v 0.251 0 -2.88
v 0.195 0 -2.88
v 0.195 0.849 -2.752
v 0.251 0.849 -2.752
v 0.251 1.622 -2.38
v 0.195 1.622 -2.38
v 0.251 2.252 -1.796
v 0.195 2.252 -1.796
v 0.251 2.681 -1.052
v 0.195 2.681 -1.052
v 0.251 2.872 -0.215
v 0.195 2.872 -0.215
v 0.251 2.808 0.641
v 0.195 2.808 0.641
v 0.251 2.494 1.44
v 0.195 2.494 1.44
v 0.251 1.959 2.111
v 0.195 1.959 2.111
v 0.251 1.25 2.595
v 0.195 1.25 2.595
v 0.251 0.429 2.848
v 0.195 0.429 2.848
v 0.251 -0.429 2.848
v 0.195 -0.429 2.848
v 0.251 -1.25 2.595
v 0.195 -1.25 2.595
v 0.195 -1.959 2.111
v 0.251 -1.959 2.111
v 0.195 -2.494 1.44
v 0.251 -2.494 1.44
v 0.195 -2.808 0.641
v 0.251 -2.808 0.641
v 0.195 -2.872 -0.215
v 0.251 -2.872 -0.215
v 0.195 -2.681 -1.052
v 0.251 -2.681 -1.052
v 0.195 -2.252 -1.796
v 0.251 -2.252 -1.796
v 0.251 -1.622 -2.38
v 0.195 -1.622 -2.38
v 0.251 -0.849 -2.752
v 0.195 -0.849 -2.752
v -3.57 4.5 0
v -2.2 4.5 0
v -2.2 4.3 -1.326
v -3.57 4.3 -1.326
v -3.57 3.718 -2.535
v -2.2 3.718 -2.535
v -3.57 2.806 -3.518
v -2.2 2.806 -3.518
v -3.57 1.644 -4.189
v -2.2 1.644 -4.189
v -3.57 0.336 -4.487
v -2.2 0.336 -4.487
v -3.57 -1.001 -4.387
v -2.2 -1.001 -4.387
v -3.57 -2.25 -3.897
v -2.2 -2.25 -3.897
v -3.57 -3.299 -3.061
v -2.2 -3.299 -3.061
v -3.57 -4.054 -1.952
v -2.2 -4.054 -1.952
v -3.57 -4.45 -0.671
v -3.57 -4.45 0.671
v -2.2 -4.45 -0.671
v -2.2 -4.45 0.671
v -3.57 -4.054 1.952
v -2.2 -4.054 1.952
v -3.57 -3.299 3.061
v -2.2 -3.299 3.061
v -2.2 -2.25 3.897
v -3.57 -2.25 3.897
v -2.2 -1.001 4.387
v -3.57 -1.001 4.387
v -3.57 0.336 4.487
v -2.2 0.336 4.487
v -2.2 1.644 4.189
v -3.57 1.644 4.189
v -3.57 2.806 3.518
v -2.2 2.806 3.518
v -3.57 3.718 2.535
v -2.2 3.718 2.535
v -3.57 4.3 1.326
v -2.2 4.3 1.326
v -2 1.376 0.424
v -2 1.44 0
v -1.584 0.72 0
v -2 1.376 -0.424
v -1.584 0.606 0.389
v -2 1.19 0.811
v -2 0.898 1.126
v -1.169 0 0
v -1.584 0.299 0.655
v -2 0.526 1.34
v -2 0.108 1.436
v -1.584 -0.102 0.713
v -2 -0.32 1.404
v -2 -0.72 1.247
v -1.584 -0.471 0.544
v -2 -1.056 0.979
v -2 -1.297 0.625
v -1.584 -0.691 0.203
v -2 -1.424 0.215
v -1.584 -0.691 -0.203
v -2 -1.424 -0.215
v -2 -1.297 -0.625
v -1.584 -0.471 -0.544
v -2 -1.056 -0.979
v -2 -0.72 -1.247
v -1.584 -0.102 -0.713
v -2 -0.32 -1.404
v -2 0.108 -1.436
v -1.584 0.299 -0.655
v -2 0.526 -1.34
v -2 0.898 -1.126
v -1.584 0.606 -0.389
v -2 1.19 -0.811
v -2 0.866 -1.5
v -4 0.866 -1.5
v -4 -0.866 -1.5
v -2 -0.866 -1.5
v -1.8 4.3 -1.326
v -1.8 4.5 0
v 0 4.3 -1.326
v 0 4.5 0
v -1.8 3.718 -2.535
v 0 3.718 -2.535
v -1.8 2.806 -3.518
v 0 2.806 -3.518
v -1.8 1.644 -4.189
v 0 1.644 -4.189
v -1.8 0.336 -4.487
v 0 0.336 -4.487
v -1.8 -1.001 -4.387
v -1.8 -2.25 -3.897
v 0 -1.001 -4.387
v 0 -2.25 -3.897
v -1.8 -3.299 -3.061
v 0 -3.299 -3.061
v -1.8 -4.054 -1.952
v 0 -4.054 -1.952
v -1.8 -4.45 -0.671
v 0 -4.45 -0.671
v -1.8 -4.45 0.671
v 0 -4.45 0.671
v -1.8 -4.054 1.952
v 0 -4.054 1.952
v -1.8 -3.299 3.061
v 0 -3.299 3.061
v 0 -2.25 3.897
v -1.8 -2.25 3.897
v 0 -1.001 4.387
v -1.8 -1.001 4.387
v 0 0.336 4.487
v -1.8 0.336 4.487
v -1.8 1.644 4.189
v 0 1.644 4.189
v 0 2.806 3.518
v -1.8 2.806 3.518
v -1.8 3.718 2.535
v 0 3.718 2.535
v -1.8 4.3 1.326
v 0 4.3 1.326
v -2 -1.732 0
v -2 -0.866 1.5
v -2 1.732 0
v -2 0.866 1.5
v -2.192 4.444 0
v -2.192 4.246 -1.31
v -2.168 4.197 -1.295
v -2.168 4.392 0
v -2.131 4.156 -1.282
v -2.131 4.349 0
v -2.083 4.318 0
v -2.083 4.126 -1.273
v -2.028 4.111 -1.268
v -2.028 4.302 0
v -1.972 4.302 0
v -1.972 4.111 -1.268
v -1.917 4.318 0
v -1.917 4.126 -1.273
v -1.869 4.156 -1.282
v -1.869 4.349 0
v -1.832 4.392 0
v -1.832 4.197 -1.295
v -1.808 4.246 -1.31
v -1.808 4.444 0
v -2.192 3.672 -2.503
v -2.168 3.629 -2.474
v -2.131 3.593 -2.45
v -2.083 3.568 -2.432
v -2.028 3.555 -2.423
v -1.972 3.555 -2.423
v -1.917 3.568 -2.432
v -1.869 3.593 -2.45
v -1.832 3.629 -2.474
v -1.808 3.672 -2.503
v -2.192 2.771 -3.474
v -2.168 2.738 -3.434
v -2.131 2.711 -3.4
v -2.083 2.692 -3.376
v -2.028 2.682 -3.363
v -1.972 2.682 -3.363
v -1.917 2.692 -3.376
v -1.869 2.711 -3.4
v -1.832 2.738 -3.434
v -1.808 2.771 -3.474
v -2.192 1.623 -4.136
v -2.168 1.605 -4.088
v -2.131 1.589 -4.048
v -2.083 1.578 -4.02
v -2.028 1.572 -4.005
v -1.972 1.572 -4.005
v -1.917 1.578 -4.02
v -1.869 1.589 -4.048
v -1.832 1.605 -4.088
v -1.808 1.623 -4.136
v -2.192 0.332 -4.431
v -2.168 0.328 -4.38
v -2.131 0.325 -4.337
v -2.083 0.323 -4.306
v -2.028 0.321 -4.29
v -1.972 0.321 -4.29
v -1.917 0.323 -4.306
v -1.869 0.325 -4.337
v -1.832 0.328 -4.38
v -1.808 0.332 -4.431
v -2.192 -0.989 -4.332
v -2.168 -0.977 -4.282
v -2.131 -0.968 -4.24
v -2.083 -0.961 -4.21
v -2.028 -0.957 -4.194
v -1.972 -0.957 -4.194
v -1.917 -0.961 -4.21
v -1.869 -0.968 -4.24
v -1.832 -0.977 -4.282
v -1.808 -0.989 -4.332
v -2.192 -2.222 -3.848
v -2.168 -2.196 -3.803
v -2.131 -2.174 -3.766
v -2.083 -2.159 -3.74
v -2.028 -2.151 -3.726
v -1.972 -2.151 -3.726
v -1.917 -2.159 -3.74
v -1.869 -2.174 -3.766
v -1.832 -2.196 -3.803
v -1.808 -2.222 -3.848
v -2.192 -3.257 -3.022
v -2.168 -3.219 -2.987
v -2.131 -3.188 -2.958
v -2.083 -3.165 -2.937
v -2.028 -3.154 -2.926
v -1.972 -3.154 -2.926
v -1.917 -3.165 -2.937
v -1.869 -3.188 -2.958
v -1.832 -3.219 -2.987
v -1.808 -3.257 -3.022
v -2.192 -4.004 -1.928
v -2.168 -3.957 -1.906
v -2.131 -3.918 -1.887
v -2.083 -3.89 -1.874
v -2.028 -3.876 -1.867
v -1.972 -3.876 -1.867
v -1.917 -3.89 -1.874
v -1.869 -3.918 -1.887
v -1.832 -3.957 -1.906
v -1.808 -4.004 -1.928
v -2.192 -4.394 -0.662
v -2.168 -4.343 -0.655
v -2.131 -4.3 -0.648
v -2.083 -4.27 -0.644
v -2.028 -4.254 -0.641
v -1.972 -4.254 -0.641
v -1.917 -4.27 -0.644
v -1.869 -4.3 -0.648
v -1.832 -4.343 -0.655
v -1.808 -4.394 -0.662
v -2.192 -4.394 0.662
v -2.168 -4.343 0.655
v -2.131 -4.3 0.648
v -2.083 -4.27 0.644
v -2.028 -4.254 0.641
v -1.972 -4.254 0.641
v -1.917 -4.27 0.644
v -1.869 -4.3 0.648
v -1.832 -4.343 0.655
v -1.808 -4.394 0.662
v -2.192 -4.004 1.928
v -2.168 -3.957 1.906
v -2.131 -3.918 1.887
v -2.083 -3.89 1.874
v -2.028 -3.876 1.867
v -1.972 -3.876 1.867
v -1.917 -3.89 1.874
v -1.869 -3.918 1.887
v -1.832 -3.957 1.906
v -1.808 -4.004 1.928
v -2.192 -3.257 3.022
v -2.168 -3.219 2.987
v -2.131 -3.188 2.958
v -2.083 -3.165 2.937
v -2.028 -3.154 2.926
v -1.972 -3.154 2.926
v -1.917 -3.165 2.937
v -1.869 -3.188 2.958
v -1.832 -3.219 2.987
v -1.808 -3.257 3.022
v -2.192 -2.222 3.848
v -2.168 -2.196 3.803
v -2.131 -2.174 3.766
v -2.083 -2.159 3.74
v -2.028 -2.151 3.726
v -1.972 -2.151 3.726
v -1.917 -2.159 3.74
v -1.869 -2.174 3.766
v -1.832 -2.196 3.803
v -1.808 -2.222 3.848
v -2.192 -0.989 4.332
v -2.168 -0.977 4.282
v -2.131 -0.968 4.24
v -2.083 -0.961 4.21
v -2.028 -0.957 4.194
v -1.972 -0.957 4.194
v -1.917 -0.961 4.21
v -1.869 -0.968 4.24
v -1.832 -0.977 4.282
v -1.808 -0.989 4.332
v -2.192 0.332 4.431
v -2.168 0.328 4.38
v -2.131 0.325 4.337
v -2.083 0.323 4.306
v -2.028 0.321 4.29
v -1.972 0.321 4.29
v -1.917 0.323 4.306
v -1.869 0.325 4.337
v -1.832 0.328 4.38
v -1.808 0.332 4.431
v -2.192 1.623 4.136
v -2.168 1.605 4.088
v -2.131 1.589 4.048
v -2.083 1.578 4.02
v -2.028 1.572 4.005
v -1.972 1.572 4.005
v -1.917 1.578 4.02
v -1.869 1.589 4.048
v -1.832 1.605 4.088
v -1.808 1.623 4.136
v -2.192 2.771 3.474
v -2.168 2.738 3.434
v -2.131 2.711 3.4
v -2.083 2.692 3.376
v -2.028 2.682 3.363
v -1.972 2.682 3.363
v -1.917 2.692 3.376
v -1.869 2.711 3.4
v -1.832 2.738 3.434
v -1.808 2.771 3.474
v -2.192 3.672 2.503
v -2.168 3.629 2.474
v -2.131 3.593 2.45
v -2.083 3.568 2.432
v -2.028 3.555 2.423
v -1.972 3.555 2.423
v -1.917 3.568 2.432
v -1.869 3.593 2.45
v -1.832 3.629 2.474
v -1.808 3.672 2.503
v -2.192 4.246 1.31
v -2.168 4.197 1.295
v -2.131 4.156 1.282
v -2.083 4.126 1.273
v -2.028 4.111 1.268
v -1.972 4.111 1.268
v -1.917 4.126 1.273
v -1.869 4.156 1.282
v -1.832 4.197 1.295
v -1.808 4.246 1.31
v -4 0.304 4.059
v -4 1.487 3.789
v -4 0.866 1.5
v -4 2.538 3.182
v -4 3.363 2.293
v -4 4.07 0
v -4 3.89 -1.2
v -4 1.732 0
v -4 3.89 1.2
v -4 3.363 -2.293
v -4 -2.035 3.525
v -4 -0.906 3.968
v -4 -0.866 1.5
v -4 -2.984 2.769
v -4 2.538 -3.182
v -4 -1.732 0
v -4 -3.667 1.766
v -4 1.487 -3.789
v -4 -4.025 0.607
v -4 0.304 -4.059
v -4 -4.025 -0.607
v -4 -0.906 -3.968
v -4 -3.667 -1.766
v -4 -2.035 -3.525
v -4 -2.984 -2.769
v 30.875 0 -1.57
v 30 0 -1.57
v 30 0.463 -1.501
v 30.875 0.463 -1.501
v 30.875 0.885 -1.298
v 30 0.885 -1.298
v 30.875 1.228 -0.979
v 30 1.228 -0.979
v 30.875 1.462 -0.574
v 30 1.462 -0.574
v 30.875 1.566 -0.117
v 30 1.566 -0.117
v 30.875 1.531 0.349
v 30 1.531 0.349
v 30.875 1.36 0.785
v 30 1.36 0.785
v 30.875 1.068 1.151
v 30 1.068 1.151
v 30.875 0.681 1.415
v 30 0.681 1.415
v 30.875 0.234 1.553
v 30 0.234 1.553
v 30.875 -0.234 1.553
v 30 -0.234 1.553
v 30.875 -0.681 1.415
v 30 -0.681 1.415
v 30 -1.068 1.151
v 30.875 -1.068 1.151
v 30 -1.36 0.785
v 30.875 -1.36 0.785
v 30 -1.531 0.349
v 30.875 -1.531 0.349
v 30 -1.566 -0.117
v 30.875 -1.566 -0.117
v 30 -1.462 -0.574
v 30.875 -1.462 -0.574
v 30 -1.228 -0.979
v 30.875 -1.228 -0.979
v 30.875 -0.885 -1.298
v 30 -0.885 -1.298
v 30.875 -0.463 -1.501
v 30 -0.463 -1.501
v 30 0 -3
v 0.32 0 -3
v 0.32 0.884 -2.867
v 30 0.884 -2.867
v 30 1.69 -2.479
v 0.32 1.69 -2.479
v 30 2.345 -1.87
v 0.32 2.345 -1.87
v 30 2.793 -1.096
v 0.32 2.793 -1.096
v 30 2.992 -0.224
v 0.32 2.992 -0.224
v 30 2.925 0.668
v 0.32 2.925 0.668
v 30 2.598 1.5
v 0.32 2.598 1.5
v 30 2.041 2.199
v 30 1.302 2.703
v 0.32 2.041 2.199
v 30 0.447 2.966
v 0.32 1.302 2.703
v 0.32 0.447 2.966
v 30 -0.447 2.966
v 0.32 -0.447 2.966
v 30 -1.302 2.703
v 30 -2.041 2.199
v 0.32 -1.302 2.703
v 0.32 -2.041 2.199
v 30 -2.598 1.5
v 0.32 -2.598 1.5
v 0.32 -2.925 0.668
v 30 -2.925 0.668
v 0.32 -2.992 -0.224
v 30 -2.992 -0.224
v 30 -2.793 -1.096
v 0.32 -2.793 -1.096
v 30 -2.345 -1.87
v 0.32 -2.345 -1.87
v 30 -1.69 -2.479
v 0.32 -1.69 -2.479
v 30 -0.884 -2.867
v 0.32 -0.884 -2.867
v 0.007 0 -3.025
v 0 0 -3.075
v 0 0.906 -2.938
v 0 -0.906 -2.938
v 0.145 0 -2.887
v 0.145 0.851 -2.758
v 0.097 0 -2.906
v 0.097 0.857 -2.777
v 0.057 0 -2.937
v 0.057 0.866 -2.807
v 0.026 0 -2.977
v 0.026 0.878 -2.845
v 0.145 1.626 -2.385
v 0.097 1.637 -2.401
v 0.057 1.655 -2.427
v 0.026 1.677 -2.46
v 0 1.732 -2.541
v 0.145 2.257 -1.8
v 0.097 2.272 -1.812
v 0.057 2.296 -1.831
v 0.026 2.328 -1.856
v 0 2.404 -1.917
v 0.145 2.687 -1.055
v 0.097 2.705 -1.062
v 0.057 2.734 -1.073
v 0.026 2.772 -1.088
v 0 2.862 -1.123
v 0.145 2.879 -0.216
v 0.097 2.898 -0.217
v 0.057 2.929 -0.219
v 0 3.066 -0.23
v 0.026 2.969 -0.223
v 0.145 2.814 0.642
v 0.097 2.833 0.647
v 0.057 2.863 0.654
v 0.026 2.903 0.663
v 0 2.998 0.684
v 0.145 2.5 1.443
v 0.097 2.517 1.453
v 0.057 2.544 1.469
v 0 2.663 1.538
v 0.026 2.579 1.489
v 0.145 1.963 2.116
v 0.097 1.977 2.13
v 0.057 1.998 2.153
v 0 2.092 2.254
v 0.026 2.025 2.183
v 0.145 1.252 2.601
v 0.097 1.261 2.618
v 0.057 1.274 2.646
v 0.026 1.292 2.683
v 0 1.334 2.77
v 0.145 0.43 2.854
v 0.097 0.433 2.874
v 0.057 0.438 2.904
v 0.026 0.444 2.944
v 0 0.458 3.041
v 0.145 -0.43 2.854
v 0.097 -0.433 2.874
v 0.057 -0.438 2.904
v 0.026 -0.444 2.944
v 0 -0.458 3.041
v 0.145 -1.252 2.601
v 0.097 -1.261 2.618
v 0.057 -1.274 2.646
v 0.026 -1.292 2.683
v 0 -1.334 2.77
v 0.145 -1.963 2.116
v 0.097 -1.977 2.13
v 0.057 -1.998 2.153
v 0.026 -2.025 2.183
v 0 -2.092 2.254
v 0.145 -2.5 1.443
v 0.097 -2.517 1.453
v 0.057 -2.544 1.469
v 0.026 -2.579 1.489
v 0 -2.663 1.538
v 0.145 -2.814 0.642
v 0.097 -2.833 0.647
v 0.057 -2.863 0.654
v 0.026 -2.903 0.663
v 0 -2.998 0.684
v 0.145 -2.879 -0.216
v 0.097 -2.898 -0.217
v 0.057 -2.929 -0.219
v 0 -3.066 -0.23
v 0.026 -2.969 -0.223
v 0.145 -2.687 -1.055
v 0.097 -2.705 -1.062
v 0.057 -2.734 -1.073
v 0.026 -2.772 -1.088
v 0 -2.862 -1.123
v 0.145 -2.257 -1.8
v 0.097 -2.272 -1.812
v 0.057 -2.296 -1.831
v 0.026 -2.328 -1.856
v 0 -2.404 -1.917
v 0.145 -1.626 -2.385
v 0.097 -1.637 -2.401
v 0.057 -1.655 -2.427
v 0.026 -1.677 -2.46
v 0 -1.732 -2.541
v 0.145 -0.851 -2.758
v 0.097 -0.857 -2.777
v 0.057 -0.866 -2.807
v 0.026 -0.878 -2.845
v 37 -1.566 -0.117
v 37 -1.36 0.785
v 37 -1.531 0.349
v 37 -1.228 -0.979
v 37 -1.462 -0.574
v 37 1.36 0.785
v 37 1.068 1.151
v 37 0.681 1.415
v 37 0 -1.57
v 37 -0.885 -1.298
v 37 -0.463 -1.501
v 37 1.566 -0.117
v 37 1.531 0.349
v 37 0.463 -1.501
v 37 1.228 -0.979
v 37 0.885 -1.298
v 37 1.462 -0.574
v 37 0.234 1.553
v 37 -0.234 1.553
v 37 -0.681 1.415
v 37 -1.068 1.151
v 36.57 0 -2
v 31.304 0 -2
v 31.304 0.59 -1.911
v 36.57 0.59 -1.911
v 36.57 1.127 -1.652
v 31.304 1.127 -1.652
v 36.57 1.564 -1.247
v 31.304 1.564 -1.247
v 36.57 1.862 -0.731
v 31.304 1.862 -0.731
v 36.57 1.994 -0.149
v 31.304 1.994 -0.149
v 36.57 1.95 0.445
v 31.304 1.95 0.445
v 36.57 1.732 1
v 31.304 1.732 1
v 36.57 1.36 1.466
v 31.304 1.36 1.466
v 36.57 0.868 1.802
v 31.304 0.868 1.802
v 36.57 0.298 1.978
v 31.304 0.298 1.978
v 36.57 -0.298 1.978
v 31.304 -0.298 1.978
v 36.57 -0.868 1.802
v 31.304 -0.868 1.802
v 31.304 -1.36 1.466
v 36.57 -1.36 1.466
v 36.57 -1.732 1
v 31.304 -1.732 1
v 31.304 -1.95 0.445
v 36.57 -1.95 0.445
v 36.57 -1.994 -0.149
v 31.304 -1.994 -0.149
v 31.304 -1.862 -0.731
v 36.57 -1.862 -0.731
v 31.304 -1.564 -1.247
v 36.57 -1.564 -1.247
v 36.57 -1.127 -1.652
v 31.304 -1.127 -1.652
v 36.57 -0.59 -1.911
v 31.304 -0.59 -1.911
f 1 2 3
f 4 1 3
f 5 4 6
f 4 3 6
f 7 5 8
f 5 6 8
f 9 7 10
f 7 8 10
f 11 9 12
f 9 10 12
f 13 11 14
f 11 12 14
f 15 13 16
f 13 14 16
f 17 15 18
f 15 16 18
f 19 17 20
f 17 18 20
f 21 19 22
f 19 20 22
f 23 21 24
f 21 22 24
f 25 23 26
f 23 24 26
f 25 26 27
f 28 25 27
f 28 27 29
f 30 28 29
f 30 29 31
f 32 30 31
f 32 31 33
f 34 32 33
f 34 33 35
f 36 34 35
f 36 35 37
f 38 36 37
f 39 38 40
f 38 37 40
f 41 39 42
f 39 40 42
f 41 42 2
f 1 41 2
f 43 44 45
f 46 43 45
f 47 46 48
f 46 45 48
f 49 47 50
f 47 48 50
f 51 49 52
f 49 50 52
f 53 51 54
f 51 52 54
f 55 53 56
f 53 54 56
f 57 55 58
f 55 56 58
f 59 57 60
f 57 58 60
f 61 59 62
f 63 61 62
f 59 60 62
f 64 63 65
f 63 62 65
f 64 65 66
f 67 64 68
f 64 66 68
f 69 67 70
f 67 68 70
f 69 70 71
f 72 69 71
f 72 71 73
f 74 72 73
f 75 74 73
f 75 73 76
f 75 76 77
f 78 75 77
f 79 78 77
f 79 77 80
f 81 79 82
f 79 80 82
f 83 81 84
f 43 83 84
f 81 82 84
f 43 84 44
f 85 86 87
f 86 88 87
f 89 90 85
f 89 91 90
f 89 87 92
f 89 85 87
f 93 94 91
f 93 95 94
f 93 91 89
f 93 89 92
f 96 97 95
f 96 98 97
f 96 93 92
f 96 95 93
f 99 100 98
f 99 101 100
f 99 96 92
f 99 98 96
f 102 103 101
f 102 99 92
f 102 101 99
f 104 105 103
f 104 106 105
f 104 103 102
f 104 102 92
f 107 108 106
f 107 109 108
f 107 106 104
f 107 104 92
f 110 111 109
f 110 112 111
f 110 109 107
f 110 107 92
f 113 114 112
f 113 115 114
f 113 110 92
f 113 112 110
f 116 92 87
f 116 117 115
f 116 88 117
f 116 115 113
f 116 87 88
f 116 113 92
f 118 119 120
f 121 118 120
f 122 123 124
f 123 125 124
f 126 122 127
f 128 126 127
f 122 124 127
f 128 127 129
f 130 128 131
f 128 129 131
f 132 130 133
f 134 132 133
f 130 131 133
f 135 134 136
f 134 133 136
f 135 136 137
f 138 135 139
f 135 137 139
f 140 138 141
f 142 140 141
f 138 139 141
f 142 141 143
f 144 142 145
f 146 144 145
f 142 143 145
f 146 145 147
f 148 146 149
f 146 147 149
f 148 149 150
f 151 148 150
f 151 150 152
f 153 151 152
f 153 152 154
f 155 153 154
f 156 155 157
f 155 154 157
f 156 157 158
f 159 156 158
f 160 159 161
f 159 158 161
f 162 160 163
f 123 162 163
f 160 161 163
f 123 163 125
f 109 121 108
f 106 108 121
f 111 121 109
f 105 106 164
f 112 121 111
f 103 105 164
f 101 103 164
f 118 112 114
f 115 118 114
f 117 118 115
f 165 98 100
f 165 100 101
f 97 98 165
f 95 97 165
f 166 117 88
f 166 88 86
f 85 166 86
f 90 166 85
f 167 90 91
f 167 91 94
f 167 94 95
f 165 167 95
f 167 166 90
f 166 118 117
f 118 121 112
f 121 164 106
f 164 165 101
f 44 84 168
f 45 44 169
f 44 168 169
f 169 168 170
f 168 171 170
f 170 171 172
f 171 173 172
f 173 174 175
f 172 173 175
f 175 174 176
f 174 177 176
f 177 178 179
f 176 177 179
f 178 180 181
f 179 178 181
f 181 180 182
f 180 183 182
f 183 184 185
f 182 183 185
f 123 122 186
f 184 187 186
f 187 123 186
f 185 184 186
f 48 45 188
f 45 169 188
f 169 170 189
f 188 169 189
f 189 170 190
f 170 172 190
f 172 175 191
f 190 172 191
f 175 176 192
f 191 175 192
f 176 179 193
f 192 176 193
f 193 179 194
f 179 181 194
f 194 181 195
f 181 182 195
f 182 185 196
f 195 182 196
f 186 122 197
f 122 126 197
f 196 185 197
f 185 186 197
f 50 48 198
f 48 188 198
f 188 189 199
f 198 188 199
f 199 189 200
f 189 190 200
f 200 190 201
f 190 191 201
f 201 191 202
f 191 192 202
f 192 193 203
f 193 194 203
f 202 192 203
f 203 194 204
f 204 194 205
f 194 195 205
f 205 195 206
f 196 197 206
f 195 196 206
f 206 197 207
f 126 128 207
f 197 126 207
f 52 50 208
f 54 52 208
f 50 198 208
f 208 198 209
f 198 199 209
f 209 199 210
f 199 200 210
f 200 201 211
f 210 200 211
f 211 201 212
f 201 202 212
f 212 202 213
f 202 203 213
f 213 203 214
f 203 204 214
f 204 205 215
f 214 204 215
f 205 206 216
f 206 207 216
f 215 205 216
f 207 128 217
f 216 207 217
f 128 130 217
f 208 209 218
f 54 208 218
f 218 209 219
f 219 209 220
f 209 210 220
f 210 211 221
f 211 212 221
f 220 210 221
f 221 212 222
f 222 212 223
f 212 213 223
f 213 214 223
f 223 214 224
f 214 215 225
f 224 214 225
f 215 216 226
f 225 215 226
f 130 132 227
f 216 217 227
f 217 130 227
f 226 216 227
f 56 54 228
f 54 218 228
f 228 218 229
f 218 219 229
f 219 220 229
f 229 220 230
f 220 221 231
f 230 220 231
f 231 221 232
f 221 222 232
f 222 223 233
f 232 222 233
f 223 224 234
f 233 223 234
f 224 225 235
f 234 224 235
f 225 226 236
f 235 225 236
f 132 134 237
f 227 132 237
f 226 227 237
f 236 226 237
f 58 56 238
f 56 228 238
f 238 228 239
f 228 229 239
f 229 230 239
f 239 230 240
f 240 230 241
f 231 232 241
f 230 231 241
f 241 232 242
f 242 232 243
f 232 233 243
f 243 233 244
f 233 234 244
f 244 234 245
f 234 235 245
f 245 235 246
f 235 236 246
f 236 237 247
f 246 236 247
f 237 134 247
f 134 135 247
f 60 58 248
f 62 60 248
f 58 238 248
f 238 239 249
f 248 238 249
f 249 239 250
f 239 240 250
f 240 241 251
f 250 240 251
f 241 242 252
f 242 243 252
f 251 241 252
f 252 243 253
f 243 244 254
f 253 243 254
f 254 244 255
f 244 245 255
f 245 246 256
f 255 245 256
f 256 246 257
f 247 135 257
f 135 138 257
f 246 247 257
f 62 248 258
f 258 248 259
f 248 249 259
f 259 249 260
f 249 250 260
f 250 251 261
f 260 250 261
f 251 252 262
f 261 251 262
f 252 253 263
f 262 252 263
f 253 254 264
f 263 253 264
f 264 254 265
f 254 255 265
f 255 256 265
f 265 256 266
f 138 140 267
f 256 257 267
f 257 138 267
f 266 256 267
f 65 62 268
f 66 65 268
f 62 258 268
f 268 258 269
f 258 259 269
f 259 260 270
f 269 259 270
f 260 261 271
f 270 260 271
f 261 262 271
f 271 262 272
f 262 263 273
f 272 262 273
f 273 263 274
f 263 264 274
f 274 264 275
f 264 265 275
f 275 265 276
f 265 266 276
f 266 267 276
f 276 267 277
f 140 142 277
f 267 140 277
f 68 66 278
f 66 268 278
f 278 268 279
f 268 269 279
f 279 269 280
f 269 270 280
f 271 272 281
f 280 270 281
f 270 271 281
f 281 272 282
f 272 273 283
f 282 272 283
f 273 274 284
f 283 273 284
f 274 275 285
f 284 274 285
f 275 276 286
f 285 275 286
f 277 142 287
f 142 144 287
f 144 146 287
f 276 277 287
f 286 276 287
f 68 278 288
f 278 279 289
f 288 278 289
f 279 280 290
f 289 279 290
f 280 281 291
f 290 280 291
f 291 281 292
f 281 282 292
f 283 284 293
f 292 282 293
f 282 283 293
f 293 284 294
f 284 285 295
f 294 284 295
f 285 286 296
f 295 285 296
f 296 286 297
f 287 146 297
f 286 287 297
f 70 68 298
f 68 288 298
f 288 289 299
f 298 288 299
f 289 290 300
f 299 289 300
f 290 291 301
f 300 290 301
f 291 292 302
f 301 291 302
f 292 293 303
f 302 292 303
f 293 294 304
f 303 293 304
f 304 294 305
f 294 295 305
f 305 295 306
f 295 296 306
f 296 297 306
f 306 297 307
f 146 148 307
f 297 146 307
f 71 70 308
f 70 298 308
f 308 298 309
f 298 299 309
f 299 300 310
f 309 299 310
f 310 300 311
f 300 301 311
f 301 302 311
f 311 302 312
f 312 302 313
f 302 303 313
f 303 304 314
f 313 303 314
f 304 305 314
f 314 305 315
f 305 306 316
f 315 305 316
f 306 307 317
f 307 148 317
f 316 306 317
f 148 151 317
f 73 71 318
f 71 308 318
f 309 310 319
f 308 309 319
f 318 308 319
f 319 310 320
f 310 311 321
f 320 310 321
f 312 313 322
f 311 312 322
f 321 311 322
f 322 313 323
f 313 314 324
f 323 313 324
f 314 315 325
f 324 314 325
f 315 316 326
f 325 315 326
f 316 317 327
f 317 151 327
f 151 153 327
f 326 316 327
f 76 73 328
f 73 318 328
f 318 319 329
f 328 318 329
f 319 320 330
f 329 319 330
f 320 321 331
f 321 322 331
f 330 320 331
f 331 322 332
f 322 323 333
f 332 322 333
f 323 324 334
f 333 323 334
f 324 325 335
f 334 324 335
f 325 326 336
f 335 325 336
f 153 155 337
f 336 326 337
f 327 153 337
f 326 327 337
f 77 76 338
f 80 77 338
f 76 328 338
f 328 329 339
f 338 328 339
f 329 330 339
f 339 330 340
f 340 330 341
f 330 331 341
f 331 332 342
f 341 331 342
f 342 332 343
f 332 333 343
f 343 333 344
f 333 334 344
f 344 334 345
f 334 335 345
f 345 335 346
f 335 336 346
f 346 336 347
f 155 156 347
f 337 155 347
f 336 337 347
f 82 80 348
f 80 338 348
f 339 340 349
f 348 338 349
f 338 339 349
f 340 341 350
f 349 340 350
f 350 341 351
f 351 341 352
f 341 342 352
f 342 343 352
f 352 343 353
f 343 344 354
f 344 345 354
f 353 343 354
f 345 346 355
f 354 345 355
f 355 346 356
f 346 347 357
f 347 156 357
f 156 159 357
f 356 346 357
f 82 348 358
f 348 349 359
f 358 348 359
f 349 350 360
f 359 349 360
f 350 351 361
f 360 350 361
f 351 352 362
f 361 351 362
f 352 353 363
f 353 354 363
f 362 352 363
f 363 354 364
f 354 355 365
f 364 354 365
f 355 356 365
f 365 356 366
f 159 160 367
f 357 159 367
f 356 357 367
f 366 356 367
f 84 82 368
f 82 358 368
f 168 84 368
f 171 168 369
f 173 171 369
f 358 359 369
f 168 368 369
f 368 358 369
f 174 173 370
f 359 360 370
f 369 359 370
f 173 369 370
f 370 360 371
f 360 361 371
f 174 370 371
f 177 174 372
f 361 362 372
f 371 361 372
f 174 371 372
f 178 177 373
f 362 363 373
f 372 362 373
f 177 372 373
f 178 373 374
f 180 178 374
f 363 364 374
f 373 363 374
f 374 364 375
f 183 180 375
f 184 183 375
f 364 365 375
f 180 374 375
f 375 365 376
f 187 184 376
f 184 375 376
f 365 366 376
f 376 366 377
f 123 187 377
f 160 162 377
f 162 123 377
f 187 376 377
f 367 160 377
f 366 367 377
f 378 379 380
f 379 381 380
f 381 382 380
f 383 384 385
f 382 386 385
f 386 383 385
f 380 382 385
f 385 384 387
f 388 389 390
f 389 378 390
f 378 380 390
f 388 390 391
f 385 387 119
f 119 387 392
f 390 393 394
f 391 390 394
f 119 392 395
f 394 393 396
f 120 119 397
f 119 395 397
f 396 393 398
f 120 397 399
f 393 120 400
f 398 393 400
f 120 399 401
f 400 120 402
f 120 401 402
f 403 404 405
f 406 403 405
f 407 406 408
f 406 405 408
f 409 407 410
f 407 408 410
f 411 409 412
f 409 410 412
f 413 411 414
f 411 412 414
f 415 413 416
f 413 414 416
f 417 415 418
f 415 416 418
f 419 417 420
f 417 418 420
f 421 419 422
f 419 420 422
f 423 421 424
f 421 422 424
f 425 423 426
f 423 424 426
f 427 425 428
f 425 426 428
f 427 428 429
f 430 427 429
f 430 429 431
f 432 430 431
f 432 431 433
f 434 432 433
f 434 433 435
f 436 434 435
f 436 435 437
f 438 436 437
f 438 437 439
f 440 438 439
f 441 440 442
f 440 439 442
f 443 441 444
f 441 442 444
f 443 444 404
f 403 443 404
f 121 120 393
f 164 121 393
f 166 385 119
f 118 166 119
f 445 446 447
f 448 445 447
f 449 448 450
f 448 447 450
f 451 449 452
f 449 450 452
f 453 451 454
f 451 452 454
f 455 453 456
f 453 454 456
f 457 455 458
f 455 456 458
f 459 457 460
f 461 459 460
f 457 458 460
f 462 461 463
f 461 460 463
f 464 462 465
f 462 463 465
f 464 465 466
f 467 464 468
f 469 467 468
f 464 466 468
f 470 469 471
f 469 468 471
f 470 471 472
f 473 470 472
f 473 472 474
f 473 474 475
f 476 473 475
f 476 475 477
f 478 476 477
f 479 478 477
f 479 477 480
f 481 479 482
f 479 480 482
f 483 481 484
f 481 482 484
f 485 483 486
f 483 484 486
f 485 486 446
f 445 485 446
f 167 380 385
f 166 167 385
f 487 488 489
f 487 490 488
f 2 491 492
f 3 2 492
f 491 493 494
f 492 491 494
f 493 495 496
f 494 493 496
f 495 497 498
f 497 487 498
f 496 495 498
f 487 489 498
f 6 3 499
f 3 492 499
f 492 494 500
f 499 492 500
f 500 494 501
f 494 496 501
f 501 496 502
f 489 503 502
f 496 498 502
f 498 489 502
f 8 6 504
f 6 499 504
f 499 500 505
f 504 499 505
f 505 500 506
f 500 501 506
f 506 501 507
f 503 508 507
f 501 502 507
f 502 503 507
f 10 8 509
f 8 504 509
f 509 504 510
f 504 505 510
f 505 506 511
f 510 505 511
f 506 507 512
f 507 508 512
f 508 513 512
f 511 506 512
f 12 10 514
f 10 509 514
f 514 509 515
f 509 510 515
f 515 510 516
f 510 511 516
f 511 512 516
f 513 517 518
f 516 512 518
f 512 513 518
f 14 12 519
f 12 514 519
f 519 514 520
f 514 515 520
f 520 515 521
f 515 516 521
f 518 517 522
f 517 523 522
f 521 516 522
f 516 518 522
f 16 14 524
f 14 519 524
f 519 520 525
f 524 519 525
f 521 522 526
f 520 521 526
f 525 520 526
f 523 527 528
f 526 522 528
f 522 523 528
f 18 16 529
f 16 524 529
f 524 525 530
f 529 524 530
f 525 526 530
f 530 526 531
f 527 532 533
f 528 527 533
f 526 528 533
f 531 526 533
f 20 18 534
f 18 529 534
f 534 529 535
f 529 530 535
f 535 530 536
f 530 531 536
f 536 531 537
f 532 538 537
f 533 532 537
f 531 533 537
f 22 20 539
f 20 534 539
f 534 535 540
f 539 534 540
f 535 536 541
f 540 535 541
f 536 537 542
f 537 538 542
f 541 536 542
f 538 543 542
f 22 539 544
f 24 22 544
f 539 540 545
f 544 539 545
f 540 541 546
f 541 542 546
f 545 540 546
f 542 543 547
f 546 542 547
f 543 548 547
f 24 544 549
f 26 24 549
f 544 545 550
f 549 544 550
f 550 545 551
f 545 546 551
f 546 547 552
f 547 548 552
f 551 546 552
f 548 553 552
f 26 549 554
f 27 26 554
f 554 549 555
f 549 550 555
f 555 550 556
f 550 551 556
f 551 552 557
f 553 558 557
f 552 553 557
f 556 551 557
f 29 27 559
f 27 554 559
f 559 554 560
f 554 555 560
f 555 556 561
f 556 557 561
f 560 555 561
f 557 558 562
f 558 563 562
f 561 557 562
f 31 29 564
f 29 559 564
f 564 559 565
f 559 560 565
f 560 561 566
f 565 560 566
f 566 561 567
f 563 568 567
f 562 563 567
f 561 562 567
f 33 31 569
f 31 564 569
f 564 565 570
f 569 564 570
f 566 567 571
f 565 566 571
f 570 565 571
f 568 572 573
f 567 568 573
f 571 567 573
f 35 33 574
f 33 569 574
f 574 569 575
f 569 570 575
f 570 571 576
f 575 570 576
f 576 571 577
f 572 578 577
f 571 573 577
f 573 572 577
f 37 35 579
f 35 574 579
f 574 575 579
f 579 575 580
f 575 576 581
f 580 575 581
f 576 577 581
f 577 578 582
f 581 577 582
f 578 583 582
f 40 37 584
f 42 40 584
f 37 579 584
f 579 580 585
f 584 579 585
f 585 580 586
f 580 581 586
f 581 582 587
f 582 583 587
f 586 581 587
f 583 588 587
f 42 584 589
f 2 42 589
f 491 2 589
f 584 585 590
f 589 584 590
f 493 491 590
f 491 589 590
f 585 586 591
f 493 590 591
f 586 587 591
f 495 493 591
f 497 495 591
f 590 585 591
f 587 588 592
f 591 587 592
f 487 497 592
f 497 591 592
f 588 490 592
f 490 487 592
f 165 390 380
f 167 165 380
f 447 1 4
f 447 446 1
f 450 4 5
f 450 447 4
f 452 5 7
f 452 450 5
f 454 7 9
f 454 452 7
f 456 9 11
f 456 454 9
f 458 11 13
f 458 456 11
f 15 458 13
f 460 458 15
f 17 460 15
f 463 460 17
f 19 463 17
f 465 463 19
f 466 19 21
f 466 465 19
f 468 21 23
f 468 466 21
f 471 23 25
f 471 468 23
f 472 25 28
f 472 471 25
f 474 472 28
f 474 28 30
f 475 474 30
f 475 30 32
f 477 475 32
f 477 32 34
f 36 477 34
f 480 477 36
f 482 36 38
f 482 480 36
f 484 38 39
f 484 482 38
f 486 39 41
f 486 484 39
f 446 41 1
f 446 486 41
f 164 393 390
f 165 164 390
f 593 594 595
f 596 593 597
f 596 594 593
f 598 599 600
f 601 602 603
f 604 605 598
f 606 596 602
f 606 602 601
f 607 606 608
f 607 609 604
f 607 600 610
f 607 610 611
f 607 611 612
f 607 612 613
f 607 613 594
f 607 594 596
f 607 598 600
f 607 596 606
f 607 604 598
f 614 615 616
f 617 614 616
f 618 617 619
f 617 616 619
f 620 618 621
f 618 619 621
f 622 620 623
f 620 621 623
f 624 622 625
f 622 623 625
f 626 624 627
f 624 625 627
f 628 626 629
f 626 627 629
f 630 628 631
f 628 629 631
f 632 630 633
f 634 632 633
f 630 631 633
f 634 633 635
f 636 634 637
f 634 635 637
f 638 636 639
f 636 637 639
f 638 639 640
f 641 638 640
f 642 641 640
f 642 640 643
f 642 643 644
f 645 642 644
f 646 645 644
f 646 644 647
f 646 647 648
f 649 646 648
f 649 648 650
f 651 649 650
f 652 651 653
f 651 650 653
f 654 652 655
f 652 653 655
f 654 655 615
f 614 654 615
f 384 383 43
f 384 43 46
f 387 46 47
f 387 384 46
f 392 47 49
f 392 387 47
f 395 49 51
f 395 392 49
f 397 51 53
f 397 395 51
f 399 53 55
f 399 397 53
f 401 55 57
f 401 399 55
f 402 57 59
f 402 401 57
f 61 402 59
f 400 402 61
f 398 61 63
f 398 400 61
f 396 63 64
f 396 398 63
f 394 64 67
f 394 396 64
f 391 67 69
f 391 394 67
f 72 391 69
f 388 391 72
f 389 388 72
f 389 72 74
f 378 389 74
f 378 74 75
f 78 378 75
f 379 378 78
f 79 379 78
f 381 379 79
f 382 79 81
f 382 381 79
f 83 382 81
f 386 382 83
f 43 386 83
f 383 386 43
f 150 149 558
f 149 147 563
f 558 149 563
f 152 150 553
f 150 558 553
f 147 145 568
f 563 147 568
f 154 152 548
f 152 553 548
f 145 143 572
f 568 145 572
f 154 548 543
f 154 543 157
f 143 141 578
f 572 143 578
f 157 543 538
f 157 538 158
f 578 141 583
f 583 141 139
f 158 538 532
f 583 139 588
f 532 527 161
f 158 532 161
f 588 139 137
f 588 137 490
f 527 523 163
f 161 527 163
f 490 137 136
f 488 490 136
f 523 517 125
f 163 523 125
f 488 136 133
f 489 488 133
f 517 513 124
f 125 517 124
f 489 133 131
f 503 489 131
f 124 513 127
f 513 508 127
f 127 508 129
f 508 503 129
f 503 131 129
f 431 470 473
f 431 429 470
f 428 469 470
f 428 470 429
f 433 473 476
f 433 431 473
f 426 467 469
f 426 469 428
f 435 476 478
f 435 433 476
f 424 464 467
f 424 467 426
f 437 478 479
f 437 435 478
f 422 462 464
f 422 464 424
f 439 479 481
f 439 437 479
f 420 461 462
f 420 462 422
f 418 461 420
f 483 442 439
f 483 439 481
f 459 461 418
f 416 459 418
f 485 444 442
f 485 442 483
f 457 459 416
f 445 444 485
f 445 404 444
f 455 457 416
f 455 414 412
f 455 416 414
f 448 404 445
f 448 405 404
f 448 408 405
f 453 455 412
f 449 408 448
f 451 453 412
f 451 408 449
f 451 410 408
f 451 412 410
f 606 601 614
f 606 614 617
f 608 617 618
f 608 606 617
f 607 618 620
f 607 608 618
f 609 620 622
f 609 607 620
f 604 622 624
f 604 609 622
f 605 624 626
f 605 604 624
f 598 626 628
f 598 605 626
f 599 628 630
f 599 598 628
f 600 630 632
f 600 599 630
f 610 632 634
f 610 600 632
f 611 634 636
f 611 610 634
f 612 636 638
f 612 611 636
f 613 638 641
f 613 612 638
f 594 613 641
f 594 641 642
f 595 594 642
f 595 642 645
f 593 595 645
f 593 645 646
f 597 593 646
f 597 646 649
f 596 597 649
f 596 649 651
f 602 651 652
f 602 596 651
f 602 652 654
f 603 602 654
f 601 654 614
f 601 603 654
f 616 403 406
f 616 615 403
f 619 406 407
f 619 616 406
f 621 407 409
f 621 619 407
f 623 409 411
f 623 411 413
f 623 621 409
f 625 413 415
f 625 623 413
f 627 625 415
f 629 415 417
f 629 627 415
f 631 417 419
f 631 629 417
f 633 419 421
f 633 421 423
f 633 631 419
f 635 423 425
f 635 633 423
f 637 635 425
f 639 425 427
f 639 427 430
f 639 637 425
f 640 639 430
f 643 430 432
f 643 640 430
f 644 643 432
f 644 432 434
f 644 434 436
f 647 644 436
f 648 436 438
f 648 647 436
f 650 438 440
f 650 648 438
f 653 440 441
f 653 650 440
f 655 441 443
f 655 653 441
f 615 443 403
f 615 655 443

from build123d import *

# Parameters (mm, degrees)
SKETCH2_R           = 2.88
BOSS_EXTRUDE1_DEPTH = 0.250717968
SKETCH3_R           = 2.88
BOSS_EXTRUDE2_DEPTH = 0.069282032
BOSS_EXTRUDE2_TAPER = -59.999999992
SKETCH4_R           = 3
BOSS_EXTRUDE3_DEPTH = 29.68
SKETCH5_R           = 1.5705
BOSS_EXTRUDE4_DEPTH = 0.875
SKETCH6_R           = 1.5705
BOSS_EXTRUDE5_DEPTH = 0.4295
BOSS_EXTRUDE5_TAPER = -45
SKETCH7_R           = 2
BOSS_EXTRUDE6_DEPTH = 5.6955
CUT_EXTRUDE1_DEPTH  = 2
CHAMFER1_SIZE       = 0.4295
FILLET1_R           = 0.195


with BuildPart() as part:
    # Sketch1 → Revolve1 (revolve)
    with BuildSketch(Plane(origin=(0, 0, 0), x_dir=(-1, 0, 0), z_dir=(0, 0, -1))):
        with BuildLine():
            Line((0, 4.5), (0, 0))
            Line((0, 0), (4, 0))
            Line((4, 0), (4, 4.5))
            Line((4, 4.5), (2.2, 4.5))
            ThreePointArc((2.2, 4.5), (2, 4.3), (1.8, 4.5))
            Line((1.8, 4.5), (0, 4.5))
        make_face()
    revolve(axis=Axis((0, 0, 0), (-1, 0, 0)))

    # Sketch2 → Boss-Extrude1 (add)
    with BuildSketch(Plane(origin=(0, 0, 0), x_dir=(0, 0, -1), z_dir=(1, 0, 0))):
        Circle(SKETCH2_R)
    extrude(amount=BOSS_EXTRUDE1_DEPTH)

    # Sketch3 → Boss-Extrude2 (add)
    with BuildSketch(Plane(origin=(0.250717968, 0, 0), x_dir=(0, 0, -1), z_dir=(1, 0, 0))):
        Circle(SKETCH3_R)
    extrude(amount=BOSS_EXTRUDE2_DEPTH, taper=BOSS_EXTRUDE2_TAPER)

    # Sketch4 → Boss-Extrude3 (add)
    with BuildSketch(Plane(origin=(0.32, 0, 0), x_dir=(0, 0, -1), z_dir=(1, 0, 0))):
        Circle(SKETCH4_R)
    extrude(amount=BOSS_EXTRUDE3_DEPTH)

    # Sketch5 → Boss-Extrude4 (add)
    with BuildSketch(Plane(origin=(30, 0, 0), x_dir=(0, 0, -1), z_dir=(1, 0, 0))):
        Circle(SKETCH5_R)
    extrude(amount=BOSS_EXTRUDE4_DEPTH)

    # Sketch6 → Boss-Extrude5 (add)
    with BuildSketch(Plane(origin=(30.875, 0, 0), x_dir=(0, 0, -1), z_dir=(1, 0, 0))):
        Circle(SKETCH6_R)
    extrude(amount=BOSS_EXTRUDE5_DEPTH, taper=BOSS_EXTRUDE5_TAPER)

    # Sketch7 → Boss-Extrude6 (add)
    with BuildSketch(Plane(origin=(31.3045, 0, 0), x_dir=(0, 0, -1), z_dir=(1, 0, 0))):
        Circle(SKETCH7_R)
    extrude(amount=BOSS_EXTRUDE6_DEPTH)

    # Sketch8 → Cut-Extrude1 (cut)
    with BuildSketch(Plane.ZY.offset(4)):
        Polygon((1.5, -0.866025404), (1.5, 0.866025404), (0, 1.732050808), (-1.5, 0.866025404), (-1.5, -0.866025404), (0, -1.732050808), align=None)
    extrude(amount=-CUT_EXTRUDE1_DEPTH, mode=Mode.SUBTRACT)

    # Sketch9 → Cut-Revolve1 (revolve, cut)
    with BuildSketch(Plane.XY):
        Polygon((-2, 1.44), (-2, 0), (-1.168615612, 0), align=None)
    revolve(axis=Axis((-2, 0, 0), (1, 0, 0)), mode=Mode.SUBTRACT)

    # Chamfer1
    chamfer1_edges = [part.edges().sort_by_distance(p)[0] for p in [
        (37, 0, 2),
        (-4, -4.5, 0),
    ]]
    chamfer(chamfer1_edges, length=CHAMFER1_SIZE)

    # Fillet1
    fillet1_edges = [part.edges().sort_by_distance(p)[0] for p in [
        (0, 0, 2.88),
    ]]
    fillet(fillet1_edges, radius=FILLET1_R)


solid = part.part
